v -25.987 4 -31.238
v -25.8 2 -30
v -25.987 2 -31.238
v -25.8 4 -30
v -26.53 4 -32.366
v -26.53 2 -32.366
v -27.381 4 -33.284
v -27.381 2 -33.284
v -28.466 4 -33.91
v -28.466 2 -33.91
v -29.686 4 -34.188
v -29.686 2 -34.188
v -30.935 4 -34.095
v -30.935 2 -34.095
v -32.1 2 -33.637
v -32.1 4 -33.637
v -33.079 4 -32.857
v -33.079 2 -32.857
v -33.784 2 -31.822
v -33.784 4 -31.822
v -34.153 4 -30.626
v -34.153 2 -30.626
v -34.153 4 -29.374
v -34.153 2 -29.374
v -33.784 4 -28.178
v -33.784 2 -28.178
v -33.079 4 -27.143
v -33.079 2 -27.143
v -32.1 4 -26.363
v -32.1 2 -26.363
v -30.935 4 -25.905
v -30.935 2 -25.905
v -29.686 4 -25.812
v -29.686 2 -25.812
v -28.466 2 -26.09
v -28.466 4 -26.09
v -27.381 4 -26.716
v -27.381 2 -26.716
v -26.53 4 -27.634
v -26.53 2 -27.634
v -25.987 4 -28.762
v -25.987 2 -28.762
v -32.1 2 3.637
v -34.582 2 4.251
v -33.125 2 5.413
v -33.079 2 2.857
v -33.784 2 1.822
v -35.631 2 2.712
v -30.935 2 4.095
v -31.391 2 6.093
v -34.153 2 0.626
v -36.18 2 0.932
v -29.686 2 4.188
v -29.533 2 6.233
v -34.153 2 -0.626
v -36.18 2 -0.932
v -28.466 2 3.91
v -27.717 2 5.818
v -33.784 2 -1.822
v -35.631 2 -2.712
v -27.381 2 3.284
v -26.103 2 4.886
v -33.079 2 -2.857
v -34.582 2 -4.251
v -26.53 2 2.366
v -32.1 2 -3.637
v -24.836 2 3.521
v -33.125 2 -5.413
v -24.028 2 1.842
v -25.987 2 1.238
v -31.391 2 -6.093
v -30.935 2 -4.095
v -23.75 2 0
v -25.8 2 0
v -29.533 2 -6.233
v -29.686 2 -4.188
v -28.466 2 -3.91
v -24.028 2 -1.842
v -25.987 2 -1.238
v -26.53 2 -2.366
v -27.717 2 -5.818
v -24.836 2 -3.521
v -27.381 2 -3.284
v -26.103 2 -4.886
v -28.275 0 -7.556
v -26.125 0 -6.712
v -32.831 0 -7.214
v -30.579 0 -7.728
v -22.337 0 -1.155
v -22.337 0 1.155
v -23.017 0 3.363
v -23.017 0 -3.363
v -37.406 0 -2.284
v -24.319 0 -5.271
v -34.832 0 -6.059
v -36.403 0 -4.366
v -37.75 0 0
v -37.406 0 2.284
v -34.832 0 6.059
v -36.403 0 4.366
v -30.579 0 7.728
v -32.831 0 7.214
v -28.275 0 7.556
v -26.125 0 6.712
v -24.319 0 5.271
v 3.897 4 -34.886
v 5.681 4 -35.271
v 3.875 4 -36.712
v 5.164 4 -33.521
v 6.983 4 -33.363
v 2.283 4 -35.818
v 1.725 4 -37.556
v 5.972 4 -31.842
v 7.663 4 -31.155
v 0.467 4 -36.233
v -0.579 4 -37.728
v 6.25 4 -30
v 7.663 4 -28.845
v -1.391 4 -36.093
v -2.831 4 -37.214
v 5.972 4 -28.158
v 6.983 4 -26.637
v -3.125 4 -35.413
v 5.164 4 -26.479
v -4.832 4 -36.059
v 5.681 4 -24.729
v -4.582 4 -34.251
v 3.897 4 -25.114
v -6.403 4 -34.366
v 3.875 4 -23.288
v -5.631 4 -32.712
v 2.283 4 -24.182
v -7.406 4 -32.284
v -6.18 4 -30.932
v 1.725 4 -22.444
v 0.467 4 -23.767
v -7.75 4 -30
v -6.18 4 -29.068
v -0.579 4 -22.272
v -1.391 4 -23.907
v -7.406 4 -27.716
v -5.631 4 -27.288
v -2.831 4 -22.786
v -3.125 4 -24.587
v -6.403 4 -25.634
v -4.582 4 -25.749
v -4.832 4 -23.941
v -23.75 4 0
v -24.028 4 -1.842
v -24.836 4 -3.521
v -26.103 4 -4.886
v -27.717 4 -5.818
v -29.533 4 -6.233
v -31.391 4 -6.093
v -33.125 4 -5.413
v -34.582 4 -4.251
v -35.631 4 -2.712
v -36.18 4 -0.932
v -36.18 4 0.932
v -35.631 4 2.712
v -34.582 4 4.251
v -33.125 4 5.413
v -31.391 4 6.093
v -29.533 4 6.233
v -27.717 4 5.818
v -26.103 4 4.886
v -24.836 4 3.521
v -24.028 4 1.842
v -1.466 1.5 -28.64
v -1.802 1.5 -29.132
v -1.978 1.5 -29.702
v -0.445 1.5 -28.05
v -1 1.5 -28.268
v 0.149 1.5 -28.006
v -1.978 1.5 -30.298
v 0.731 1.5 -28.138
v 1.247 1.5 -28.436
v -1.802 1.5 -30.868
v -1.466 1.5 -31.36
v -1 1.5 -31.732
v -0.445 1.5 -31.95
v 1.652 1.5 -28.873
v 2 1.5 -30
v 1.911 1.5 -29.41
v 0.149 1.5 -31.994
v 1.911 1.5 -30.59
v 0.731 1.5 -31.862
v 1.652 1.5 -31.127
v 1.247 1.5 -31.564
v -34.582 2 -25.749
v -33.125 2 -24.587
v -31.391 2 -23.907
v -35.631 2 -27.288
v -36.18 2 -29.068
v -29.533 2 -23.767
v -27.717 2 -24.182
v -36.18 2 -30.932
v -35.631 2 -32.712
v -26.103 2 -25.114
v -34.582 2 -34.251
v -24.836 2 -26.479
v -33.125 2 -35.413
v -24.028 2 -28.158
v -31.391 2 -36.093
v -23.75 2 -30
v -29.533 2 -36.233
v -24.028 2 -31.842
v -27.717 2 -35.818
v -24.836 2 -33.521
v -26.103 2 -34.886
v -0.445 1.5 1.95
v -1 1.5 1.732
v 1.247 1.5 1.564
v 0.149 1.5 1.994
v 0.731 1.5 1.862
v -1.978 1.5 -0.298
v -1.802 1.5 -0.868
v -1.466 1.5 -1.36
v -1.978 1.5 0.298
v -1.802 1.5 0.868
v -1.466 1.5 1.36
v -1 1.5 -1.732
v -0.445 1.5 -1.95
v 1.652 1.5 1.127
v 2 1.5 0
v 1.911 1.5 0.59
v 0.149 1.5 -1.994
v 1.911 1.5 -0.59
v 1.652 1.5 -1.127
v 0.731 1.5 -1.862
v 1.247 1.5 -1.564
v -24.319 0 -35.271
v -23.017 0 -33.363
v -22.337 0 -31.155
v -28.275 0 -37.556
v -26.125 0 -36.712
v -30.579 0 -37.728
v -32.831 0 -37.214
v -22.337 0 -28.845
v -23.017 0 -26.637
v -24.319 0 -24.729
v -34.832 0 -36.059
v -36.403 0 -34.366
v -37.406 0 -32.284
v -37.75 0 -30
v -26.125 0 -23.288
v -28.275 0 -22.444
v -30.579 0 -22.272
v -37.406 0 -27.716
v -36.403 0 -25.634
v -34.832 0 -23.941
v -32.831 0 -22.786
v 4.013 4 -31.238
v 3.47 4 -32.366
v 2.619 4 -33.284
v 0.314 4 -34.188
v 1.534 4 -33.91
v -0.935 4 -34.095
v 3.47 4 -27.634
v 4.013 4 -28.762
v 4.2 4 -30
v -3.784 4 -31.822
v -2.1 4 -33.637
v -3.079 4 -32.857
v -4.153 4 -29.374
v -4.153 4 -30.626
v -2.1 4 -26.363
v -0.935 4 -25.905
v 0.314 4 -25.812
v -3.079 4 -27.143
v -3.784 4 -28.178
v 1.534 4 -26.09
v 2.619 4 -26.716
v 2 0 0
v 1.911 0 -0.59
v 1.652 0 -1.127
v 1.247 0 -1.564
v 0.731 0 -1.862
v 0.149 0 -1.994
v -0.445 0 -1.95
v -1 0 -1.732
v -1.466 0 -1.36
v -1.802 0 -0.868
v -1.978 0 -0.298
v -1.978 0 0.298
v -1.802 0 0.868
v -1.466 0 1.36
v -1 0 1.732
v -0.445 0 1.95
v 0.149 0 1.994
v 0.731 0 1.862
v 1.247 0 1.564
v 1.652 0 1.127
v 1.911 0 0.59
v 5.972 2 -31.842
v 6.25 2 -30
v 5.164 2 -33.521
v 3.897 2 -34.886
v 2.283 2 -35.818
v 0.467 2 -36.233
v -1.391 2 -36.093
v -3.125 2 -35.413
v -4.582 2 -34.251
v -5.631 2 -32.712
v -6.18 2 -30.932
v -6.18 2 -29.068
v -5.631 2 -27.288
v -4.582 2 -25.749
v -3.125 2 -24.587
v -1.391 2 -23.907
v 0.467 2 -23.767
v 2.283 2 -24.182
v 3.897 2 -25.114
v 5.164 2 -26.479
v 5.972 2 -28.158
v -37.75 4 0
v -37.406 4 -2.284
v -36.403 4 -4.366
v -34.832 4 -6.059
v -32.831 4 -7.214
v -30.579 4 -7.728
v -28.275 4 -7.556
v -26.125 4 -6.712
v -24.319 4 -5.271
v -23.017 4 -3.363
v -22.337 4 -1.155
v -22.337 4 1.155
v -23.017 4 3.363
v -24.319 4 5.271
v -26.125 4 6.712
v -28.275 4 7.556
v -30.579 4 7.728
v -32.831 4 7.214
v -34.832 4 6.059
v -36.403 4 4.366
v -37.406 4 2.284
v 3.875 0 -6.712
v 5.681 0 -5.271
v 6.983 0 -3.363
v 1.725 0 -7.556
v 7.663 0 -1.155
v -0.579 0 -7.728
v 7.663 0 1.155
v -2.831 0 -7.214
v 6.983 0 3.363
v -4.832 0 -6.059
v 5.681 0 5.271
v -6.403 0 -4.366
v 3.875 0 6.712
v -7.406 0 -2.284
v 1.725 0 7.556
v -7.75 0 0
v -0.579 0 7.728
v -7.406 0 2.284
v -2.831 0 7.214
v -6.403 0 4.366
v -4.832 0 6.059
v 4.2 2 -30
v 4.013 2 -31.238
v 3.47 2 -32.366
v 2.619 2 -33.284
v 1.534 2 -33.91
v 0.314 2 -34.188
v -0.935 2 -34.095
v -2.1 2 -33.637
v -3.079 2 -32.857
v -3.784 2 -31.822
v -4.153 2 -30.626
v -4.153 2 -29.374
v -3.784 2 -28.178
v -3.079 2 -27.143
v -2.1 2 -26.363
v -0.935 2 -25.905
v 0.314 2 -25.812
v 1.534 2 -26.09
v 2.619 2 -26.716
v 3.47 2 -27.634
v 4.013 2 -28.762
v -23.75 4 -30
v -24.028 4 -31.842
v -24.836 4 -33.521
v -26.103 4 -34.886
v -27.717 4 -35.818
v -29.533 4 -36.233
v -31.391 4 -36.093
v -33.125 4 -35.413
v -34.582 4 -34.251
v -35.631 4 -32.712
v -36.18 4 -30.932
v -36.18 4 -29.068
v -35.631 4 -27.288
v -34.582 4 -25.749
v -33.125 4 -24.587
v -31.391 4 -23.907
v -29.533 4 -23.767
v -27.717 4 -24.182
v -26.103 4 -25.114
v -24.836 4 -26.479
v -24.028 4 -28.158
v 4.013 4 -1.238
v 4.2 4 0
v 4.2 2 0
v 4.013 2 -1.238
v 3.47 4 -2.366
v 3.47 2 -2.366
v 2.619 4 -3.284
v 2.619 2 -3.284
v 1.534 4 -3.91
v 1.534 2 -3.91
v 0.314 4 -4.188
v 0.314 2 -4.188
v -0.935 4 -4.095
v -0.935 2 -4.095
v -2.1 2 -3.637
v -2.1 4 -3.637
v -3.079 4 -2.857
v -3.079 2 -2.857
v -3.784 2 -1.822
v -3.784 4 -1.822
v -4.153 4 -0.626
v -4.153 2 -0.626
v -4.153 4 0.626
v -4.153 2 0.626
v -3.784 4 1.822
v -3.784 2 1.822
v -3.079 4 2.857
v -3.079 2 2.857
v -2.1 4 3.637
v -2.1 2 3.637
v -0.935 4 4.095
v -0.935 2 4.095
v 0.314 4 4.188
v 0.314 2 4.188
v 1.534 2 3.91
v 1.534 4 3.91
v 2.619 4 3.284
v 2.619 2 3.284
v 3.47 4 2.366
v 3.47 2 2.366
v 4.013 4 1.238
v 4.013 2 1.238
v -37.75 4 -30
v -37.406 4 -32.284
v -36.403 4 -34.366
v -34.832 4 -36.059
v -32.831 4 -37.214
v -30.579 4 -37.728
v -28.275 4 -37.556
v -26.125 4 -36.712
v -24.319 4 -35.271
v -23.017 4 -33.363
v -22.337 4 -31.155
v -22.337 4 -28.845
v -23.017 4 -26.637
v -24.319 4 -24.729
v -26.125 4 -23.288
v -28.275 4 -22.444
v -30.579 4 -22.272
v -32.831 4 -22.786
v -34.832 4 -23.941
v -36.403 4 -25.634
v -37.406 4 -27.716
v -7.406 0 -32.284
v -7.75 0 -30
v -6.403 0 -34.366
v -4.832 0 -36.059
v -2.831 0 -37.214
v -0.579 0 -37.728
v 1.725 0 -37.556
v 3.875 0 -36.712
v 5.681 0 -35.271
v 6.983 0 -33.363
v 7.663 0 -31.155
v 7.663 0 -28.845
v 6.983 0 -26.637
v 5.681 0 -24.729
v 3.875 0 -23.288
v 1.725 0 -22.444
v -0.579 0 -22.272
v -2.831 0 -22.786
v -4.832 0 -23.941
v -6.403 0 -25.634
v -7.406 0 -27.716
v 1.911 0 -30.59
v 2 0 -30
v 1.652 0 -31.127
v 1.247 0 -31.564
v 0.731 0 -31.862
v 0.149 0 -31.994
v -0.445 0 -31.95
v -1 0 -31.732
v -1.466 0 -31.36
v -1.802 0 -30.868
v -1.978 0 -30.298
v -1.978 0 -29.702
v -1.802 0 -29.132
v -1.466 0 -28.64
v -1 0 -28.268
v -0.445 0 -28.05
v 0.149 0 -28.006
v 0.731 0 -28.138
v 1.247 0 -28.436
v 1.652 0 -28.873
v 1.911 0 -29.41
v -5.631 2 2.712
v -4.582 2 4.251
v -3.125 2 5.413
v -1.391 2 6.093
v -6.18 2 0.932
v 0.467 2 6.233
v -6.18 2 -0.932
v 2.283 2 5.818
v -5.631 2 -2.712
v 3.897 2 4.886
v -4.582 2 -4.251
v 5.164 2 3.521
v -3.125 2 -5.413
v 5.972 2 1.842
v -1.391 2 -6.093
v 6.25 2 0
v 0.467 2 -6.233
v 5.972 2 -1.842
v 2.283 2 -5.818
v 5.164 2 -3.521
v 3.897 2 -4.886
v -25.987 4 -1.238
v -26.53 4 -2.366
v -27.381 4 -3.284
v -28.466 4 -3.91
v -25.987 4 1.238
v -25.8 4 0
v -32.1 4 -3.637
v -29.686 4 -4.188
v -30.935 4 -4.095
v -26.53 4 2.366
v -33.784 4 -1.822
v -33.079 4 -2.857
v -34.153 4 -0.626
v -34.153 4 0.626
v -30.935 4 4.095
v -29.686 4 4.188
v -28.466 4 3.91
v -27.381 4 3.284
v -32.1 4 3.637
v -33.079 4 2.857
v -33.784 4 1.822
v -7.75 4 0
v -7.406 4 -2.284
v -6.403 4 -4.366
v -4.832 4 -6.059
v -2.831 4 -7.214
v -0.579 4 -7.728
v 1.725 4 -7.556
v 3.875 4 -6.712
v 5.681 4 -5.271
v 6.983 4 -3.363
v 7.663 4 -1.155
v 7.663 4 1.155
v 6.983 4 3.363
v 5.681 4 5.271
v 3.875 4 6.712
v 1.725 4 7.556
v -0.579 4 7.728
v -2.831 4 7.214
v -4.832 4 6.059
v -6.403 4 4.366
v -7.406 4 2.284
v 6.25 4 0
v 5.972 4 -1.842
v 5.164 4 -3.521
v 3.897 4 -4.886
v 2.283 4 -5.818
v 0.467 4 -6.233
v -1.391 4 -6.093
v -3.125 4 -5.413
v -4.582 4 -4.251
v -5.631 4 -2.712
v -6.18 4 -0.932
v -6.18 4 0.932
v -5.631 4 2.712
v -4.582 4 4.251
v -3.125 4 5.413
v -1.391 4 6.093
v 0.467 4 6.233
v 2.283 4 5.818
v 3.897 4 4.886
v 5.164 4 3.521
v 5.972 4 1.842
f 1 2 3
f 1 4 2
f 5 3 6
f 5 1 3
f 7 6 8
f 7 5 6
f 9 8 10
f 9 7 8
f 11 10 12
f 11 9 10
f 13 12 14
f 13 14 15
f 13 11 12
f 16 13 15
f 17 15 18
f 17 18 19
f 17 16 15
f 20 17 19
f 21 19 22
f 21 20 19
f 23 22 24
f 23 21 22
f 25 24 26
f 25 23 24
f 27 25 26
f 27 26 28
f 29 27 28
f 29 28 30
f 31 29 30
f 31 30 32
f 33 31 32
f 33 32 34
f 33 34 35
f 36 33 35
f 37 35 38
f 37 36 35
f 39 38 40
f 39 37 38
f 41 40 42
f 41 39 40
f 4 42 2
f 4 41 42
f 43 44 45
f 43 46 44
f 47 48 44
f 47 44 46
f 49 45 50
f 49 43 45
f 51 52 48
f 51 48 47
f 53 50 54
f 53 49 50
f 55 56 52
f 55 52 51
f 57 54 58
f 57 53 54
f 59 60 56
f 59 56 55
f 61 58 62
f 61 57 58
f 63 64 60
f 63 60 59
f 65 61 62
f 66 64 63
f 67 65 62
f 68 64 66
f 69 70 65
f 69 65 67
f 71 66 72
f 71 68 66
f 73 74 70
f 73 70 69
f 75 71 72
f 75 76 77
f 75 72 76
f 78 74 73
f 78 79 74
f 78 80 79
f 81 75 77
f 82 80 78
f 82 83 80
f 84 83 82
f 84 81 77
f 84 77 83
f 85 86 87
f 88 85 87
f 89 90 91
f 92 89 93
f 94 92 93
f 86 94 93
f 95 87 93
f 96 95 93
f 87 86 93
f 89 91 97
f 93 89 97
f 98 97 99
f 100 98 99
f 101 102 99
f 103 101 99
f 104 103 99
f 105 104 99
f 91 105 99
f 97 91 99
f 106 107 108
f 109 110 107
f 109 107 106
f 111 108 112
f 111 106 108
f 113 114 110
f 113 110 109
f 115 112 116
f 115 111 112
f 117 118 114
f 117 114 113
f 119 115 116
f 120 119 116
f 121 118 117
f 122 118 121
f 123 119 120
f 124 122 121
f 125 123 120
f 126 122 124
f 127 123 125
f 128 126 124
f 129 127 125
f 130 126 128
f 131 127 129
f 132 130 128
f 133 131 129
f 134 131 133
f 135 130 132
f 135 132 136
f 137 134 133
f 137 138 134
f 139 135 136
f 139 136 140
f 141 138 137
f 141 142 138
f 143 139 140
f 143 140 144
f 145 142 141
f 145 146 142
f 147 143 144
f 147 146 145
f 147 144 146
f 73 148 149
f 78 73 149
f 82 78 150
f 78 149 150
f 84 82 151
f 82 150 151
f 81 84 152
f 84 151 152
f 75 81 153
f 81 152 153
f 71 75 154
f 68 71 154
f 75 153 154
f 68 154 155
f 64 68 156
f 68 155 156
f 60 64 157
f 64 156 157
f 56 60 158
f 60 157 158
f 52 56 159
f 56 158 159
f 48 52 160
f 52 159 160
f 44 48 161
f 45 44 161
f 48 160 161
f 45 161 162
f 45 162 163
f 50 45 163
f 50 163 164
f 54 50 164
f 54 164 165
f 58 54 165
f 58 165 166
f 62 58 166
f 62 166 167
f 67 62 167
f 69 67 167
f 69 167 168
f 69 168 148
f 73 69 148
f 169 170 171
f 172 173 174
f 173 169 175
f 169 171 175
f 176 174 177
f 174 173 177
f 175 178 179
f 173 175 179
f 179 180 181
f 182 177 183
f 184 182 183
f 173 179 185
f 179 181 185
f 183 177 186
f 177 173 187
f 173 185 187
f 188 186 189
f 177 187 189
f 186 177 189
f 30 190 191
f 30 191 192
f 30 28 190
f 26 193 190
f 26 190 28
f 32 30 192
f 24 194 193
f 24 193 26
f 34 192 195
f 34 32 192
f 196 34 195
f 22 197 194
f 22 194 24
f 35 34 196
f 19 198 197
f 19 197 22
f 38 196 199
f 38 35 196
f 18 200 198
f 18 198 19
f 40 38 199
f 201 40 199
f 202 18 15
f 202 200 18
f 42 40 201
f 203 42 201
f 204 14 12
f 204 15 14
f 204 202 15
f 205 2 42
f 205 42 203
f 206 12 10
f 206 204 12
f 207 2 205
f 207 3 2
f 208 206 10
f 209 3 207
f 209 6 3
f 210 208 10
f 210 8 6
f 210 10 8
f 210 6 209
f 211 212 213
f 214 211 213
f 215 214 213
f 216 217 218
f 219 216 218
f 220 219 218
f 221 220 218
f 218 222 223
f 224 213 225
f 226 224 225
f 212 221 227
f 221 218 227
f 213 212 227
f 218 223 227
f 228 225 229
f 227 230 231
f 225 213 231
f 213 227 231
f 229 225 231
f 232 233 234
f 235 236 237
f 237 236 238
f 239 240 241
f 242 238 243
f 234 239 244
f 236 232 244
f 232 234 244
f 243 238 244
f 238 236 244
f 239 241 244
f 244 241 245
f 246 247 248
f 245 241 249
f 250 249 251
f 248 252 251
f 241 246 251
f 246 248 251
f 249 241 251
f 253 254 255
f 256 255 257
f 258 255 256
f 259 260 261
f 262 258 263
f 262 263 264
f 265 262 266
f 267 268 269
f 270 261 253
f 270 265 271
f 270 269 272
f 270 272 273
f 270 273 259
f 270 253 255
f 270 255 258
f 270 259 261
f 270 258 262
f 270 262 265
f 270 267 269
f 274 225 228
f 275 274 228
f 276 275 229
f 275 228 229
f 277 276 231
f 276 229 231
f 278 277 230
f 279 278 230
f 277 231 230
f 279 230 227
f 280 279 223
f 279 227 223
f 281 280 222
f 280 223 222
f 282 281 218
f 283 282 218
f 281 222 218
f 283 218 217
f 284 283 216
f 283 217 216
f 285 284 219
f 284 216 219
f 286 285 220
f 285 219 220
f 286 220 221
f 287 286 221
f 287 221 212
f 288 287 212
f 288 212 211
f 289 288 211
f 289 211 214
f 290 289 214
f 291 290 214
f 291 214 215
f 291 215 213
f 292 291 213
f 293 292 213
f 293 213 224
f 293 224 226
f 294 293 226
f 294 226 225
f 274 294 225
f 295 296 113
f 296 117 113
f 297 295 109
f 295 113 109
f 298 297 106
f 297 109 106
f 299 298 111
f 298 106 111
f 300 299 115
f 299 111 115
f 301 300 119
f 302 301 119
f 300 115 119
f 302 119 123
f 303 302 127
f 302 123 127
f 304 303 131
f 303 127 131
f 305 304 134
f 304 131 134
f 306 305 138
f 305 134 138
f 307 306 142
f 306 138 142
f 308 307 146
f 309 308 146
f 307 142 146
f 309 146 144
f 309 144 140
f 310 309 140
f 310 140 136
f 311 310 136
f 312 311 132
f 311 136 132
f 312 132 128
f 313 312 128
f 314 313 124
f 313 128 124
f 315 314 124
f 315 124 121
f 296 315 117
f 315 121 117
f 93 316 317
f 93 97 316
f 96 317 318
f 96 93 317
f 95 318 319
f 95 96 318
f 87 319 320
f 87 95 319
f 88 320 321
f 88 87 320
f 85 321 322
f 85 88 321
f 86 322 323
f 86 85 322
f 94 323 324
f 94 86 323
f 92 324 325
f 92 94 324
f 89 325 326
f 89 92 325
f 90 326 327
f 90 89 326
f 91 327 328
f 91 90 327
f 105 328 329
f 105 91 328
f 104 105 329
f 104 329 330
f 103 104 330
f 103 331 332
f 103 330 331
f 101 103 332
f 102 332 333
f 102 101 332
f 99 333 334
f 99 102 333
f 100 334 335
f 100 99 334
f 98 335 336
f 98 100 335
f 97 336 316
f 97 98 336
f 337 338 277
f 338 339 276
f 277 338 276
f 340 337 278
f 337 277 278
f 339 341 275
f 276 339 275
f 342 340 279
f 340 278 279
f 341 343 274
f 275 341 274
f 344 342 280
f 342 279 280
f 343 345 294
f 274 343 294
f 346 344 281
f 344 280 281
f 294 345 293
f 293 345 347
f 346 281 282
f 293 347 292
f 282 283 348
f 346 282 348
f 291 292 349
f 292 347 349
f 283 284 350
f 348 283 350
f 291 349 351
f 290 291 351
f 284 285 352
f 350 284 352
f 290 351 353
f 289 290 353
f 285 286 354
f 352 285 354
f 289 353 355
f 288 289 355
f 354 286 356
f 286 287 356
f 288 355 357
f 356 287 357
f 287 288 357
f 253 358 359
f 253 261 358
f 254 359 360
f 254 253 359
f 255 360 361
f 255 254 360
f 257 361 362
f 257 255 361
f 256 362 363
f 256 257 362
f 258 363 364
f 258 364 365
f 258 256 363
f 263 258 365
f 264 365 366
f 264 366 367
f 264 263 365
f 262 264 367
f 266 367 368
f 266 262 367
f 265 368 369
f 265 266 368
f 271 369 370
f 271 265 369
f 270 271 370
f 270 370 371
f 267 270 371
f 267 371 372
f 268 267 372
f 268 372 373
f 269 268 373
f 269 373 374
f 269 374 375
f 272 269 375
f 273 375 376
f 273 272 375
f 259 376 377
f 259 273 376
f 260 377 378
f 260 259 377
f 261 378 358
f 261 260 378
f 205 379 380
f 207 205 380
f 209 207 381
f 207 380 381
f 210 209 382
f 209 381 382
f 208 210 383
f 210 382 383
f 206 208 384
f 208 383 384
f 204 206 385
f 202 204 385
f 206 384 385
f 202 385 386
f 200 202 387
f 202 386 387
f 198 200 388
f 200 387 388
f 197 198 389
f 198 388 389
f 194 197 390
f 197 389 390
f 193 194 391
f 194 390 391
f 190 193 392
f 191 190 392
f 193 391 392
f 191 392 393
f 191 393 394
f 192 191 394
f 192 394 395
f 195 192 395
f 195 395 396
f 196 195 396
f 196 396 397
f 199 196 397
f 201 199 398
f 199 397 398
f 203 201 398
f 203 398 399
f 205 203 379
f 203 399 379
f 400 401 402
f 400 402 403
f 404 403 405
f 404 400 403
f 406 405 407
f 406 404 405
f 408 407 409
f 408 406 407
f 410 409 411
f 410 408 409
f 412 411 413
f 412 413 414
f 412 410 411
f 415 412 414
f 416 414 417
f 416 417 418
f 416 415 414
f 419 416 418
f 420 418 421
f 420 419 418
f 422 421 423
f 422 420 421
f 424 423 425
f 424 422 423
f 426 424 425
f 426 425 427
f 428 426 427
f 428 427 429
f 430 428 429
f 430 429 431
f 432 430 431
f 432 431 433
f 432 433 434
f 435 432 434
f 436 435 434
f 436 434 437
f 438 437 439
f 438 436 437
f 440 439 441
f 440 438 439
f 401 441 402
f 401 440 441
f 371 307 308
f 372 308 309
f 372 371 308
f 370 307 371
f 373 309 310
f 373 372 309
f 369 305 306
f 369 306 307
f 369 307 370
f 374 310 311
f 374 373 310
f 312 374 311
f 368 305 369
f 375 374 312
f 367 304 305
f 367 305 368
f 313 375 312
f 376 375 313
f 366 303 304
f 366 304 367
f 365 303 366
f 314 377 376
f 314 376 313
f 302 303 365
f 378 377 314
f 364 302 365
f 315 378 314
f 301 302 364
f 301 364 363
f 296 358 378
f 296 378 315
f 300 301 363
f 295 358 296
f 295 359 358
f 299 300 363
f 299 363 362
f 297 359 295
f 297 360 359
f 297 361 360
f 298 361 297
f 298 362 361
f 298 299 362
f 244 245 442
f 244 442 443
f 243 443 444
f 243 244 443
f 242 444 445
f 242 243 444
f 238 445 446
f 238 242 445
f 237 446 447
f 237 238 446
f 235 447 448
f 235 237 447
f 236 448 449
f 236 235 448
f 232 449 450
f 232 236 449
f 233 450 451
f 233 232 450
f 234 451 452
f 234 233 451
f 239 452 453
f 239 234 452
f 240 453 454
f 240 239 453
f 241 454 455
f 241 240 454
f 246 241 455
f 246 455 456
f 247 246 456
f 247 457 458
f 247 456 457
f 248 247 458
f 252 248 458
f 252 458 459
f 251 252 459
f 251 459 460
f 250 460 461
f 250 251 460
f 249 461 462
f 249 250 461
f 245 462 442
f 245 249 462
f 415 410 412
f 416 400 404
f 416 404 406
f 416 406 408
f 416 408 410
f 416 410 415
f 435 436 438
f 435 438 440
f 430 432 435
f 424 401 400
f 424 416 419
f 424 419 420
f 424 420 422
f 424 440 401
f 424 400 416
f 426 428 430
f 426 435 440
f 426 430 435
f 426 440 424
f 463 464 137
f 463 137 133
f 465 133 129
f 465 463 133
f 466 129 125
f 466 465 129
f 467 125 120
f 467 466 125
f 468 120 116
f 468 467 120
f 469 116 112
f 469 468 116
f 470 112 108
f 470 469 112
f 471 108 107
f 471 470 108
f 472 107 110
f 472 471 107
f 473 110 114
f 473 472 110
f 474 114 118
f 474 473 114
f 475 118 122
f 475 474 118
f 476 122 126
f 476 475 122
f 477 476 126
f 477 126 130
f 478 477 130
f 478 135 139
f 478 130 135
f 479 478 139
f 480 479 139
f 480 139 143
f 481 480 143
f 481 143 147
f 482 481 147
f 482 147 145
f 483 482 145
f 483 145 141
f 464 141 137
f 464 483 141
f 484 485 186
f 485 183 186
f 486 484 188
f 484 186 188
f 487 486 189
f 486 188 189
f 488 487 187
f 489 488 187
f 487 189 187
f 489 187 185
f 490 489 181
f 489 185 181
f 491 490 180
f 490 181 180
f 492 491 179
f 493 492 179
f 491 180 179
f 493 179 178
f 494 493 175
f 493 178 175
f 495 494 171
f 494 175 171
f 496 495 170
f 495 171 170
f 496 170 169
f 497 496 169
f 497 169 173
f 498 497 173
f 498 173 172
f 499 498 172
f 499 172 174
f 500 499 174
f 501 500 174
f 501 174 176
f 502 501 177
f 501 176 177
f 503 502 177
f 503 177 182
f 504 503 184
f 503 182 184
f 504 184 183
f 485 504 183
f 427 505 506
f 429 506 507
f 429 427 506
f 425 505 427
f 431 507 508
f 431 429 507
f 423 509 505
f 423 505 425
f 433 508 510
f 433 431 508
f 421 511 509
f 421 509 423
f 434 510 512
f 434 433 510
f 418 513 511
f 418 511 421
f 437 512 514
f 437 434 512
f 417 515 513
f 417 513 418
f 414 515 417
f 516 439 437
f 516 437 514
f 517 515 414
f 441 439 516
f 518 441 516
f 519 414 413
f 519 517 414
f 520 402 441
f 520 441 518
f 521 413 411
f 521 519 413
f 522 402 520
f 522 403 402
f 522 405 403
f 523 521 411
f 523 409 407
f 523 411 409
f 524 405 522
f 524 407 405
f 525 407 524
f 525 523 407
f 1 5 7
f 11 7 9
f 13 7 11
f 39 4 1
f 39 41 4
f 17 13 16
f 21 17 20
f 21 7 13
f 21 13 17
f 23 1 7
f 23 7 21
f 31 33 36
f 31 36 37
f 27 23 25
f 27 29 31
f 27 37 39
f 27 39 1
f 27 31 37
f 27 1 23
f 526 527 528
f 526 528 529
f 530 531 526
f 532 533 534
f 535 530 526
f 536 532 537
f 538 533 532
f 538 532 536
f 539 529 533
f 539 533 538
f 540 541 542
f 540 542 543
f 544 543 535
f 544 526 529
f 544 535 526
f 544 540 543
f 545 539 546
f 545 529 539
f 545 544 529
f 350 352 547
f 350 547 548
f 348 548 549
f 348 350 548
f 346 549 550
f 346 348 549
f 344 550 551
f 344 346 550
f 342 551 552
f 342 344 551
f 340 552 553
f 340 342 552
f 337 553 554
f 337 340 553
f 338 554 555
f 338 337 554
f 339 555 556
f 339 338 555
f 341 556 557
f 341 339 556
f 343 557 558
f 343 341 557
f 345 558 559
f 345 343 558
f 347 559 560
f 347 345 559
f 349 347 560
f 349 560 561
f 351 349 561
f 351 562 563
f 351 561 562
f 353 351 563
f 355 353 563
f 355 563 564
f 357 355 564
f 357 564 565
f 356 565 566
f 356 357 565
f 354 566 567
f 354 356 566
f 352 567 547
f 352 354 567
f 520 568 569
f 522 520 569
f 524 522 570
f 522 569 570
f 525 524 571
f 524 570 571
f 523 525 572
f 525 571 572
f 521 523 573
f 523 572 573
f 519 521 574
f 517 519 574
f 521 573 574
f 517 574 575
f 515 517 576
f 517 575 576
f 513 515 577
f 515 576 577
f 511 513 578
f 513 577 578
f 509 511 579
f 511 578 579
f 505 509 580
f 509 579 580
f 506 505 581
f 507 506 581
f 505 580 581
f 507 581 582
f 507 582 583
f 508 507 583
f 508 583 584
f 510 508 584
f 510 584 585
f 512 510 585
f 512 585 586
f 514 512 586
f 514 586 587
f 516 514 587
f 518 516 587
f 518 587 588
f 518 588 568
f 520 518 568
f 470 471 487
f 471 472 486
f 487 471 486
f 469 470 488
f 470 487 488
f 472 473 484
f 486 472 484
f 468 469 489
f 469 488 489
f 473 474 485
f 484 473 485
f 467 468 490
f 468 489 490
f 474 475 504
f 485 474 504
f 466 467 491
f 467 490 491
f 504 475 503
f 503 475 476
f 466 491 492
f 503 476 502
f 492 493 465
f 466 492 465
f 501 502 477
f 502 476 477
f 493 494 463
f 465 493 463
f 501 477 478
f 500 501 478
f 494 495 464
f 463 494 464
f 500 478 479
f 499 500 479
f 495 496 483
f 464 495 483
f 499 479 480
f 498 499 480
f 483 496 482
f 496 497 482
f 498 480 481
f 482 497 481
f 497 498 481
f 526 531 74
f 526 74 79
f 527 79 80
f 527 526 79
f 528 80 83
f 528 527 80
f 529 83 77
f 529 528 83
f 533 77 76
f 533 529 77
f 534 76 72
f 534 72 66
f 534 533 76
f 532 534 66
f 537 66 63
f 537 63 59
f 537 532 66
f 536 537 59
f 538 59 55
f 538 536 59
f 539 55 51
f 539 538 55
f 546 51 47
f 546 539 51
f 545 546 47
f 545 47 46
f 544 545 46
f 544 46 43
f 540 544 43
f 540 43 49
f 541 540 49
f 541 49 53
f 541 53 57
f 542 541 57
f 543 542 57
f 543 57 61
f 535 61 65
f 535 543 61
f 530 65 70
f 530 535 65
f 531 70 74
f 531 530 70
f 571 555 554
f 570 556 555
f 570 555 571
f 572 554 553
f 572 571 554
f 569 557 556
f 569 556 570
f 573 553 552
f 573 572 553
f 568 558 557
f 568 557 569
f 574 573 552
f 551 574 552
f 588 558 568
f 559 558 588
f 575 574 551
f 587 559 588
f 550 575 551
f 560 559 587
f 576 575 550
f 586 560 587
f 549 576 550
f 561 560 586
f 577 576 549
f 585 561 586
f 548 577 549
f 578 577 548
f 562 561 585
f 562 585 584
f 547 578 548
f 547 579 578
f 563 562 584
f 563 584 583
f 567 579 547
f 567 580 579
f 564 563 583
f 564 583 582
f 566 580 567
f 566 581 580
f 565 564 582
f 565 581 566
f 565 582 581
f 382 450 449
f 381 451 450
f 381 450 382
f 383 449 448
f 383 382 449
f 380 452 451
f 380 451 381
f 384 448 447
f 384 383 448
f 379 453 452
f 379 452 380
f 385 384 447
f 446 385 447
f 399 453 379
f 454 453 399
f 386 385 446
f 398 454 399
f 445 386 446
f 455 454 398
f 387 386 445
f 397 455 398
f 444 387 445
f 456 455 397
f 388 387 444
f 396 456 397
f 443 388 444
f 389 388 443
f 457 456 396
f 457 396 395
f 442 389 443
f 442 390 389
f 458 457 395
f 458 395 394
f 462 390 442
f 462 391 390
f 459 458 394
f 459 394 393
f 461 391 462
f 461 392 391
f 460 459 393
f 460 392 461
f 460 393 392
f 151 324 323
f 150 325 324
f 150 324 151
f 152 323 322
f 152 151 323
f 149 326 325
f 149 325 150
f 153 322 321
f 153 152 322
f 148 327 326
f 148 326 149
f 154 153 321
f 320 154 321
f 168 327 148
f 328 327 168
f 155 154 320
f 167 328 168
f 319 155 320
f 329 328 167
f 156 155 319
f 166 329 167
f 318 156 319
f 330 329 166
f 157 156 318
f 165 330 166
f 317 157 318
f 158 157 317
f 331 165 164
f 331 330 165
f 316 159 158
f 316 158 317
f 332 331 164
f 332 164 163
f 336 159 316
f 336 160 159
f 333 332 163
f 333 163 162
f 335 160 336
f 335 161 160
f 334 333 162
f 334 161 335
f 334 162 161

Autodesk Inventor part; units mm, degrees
ref_plane "YZ Plane" through (0, 0, 0) normal (1, 0, 0) x (0, 1, 0)
ref_plane "XZ Plane" through (0, 0, 0) normal (0, 1, 0) x (-1, 0, 0)
sketch "Esboço1" plane through (0, 0, 0) normal (0, 1, 0) x (-1, 0, 0)
  circle A0 centre (0, 0) radius 7.75
  line L0 (0, 0) -> (0, -30) construction
  circle A1 centre (0, -30) radius 7.75
  line L1 (0, -30) -> (0, -60) construction
  circle A2 centre (30, 0) radius 7.75
  line L2 (30, 0) -> (30, -30) construction
  circle A3 centre (30, -30) radius 7.75
  line L3 (30, -30) -> (30, -60) construction
  line L4 (0, 0) -> (30, 0) construction
  dimension "d0" = 15.5
  dimension "d1" = 30
  dimension "d2" = 15.5
  dimension "d3" = 30
  dimension "d4" = 15.5
  dimension "d5" = 30
  dimension "d6" = 15.5
  dimension "d7" = 30
  dimension "d8" = 30
extrude "Extrusão1" add sketch "Esboço1" along normal blind 4
sketch "Esboço2" plane through (-30, 4, 0) normal (0, 1, 0) x (1, 0, 0)
  circle A0 centre (0, 0) radius 7.75 projected
  circle A1 centre (0, 30) radius 7.75 projected
  circle A2 centre (30, 30) radius 7.75 projected
  circle A3 centre (0, 0) radius 6.25
  circle A4 centre (0, 30) radius 6.25
  circle A5 centre (0, 0) radius 4.2
  circle A6 centre (0, 30) radius 4.2
  circle A7 centre (30, 0) radius 6.25
  circle A8 centre (30, 30) radius 6.25
  circle A9 centre (30, 0) radius 4.2
  circle A10 centre (30, 30) radius 4.2
  dimension "d12" = 12.5
  dimension "d13" = 12.5
  dimension "d17" = 8.4
  dimension "d18" = 8.4
  dimension "d25" = 12.5
  dimension "d26" = 12.5
  dimension "d27" = 8.4
  dimension "d28" = 8.4
ref_plane "Plano de trabalho1" through (0, 1.5, 0) normal (0, 1, 0) x (1, 0, 0)
sketch "Esboço3" plane through (0, 1.5, 0) normal (0, 1, 0) x (1, 0, 0)
  circle A0 centre (0, 0) radius 2
  circle A1 centre (0, 30) radius 6.25 projected
  circle A2 centre (0, 30) radius 2
  dimension "d21" = 4
  dimension "d22" = 4
extrude "Extrusão4" cut sketch "Esboço3" against normal blind 2.5 contours A0 | A2
extrude "Extrusão5" cut sketch "Esboço2" against normal blind 2 contours A3 | A4 | A7 | A8
properties part number "pé"
